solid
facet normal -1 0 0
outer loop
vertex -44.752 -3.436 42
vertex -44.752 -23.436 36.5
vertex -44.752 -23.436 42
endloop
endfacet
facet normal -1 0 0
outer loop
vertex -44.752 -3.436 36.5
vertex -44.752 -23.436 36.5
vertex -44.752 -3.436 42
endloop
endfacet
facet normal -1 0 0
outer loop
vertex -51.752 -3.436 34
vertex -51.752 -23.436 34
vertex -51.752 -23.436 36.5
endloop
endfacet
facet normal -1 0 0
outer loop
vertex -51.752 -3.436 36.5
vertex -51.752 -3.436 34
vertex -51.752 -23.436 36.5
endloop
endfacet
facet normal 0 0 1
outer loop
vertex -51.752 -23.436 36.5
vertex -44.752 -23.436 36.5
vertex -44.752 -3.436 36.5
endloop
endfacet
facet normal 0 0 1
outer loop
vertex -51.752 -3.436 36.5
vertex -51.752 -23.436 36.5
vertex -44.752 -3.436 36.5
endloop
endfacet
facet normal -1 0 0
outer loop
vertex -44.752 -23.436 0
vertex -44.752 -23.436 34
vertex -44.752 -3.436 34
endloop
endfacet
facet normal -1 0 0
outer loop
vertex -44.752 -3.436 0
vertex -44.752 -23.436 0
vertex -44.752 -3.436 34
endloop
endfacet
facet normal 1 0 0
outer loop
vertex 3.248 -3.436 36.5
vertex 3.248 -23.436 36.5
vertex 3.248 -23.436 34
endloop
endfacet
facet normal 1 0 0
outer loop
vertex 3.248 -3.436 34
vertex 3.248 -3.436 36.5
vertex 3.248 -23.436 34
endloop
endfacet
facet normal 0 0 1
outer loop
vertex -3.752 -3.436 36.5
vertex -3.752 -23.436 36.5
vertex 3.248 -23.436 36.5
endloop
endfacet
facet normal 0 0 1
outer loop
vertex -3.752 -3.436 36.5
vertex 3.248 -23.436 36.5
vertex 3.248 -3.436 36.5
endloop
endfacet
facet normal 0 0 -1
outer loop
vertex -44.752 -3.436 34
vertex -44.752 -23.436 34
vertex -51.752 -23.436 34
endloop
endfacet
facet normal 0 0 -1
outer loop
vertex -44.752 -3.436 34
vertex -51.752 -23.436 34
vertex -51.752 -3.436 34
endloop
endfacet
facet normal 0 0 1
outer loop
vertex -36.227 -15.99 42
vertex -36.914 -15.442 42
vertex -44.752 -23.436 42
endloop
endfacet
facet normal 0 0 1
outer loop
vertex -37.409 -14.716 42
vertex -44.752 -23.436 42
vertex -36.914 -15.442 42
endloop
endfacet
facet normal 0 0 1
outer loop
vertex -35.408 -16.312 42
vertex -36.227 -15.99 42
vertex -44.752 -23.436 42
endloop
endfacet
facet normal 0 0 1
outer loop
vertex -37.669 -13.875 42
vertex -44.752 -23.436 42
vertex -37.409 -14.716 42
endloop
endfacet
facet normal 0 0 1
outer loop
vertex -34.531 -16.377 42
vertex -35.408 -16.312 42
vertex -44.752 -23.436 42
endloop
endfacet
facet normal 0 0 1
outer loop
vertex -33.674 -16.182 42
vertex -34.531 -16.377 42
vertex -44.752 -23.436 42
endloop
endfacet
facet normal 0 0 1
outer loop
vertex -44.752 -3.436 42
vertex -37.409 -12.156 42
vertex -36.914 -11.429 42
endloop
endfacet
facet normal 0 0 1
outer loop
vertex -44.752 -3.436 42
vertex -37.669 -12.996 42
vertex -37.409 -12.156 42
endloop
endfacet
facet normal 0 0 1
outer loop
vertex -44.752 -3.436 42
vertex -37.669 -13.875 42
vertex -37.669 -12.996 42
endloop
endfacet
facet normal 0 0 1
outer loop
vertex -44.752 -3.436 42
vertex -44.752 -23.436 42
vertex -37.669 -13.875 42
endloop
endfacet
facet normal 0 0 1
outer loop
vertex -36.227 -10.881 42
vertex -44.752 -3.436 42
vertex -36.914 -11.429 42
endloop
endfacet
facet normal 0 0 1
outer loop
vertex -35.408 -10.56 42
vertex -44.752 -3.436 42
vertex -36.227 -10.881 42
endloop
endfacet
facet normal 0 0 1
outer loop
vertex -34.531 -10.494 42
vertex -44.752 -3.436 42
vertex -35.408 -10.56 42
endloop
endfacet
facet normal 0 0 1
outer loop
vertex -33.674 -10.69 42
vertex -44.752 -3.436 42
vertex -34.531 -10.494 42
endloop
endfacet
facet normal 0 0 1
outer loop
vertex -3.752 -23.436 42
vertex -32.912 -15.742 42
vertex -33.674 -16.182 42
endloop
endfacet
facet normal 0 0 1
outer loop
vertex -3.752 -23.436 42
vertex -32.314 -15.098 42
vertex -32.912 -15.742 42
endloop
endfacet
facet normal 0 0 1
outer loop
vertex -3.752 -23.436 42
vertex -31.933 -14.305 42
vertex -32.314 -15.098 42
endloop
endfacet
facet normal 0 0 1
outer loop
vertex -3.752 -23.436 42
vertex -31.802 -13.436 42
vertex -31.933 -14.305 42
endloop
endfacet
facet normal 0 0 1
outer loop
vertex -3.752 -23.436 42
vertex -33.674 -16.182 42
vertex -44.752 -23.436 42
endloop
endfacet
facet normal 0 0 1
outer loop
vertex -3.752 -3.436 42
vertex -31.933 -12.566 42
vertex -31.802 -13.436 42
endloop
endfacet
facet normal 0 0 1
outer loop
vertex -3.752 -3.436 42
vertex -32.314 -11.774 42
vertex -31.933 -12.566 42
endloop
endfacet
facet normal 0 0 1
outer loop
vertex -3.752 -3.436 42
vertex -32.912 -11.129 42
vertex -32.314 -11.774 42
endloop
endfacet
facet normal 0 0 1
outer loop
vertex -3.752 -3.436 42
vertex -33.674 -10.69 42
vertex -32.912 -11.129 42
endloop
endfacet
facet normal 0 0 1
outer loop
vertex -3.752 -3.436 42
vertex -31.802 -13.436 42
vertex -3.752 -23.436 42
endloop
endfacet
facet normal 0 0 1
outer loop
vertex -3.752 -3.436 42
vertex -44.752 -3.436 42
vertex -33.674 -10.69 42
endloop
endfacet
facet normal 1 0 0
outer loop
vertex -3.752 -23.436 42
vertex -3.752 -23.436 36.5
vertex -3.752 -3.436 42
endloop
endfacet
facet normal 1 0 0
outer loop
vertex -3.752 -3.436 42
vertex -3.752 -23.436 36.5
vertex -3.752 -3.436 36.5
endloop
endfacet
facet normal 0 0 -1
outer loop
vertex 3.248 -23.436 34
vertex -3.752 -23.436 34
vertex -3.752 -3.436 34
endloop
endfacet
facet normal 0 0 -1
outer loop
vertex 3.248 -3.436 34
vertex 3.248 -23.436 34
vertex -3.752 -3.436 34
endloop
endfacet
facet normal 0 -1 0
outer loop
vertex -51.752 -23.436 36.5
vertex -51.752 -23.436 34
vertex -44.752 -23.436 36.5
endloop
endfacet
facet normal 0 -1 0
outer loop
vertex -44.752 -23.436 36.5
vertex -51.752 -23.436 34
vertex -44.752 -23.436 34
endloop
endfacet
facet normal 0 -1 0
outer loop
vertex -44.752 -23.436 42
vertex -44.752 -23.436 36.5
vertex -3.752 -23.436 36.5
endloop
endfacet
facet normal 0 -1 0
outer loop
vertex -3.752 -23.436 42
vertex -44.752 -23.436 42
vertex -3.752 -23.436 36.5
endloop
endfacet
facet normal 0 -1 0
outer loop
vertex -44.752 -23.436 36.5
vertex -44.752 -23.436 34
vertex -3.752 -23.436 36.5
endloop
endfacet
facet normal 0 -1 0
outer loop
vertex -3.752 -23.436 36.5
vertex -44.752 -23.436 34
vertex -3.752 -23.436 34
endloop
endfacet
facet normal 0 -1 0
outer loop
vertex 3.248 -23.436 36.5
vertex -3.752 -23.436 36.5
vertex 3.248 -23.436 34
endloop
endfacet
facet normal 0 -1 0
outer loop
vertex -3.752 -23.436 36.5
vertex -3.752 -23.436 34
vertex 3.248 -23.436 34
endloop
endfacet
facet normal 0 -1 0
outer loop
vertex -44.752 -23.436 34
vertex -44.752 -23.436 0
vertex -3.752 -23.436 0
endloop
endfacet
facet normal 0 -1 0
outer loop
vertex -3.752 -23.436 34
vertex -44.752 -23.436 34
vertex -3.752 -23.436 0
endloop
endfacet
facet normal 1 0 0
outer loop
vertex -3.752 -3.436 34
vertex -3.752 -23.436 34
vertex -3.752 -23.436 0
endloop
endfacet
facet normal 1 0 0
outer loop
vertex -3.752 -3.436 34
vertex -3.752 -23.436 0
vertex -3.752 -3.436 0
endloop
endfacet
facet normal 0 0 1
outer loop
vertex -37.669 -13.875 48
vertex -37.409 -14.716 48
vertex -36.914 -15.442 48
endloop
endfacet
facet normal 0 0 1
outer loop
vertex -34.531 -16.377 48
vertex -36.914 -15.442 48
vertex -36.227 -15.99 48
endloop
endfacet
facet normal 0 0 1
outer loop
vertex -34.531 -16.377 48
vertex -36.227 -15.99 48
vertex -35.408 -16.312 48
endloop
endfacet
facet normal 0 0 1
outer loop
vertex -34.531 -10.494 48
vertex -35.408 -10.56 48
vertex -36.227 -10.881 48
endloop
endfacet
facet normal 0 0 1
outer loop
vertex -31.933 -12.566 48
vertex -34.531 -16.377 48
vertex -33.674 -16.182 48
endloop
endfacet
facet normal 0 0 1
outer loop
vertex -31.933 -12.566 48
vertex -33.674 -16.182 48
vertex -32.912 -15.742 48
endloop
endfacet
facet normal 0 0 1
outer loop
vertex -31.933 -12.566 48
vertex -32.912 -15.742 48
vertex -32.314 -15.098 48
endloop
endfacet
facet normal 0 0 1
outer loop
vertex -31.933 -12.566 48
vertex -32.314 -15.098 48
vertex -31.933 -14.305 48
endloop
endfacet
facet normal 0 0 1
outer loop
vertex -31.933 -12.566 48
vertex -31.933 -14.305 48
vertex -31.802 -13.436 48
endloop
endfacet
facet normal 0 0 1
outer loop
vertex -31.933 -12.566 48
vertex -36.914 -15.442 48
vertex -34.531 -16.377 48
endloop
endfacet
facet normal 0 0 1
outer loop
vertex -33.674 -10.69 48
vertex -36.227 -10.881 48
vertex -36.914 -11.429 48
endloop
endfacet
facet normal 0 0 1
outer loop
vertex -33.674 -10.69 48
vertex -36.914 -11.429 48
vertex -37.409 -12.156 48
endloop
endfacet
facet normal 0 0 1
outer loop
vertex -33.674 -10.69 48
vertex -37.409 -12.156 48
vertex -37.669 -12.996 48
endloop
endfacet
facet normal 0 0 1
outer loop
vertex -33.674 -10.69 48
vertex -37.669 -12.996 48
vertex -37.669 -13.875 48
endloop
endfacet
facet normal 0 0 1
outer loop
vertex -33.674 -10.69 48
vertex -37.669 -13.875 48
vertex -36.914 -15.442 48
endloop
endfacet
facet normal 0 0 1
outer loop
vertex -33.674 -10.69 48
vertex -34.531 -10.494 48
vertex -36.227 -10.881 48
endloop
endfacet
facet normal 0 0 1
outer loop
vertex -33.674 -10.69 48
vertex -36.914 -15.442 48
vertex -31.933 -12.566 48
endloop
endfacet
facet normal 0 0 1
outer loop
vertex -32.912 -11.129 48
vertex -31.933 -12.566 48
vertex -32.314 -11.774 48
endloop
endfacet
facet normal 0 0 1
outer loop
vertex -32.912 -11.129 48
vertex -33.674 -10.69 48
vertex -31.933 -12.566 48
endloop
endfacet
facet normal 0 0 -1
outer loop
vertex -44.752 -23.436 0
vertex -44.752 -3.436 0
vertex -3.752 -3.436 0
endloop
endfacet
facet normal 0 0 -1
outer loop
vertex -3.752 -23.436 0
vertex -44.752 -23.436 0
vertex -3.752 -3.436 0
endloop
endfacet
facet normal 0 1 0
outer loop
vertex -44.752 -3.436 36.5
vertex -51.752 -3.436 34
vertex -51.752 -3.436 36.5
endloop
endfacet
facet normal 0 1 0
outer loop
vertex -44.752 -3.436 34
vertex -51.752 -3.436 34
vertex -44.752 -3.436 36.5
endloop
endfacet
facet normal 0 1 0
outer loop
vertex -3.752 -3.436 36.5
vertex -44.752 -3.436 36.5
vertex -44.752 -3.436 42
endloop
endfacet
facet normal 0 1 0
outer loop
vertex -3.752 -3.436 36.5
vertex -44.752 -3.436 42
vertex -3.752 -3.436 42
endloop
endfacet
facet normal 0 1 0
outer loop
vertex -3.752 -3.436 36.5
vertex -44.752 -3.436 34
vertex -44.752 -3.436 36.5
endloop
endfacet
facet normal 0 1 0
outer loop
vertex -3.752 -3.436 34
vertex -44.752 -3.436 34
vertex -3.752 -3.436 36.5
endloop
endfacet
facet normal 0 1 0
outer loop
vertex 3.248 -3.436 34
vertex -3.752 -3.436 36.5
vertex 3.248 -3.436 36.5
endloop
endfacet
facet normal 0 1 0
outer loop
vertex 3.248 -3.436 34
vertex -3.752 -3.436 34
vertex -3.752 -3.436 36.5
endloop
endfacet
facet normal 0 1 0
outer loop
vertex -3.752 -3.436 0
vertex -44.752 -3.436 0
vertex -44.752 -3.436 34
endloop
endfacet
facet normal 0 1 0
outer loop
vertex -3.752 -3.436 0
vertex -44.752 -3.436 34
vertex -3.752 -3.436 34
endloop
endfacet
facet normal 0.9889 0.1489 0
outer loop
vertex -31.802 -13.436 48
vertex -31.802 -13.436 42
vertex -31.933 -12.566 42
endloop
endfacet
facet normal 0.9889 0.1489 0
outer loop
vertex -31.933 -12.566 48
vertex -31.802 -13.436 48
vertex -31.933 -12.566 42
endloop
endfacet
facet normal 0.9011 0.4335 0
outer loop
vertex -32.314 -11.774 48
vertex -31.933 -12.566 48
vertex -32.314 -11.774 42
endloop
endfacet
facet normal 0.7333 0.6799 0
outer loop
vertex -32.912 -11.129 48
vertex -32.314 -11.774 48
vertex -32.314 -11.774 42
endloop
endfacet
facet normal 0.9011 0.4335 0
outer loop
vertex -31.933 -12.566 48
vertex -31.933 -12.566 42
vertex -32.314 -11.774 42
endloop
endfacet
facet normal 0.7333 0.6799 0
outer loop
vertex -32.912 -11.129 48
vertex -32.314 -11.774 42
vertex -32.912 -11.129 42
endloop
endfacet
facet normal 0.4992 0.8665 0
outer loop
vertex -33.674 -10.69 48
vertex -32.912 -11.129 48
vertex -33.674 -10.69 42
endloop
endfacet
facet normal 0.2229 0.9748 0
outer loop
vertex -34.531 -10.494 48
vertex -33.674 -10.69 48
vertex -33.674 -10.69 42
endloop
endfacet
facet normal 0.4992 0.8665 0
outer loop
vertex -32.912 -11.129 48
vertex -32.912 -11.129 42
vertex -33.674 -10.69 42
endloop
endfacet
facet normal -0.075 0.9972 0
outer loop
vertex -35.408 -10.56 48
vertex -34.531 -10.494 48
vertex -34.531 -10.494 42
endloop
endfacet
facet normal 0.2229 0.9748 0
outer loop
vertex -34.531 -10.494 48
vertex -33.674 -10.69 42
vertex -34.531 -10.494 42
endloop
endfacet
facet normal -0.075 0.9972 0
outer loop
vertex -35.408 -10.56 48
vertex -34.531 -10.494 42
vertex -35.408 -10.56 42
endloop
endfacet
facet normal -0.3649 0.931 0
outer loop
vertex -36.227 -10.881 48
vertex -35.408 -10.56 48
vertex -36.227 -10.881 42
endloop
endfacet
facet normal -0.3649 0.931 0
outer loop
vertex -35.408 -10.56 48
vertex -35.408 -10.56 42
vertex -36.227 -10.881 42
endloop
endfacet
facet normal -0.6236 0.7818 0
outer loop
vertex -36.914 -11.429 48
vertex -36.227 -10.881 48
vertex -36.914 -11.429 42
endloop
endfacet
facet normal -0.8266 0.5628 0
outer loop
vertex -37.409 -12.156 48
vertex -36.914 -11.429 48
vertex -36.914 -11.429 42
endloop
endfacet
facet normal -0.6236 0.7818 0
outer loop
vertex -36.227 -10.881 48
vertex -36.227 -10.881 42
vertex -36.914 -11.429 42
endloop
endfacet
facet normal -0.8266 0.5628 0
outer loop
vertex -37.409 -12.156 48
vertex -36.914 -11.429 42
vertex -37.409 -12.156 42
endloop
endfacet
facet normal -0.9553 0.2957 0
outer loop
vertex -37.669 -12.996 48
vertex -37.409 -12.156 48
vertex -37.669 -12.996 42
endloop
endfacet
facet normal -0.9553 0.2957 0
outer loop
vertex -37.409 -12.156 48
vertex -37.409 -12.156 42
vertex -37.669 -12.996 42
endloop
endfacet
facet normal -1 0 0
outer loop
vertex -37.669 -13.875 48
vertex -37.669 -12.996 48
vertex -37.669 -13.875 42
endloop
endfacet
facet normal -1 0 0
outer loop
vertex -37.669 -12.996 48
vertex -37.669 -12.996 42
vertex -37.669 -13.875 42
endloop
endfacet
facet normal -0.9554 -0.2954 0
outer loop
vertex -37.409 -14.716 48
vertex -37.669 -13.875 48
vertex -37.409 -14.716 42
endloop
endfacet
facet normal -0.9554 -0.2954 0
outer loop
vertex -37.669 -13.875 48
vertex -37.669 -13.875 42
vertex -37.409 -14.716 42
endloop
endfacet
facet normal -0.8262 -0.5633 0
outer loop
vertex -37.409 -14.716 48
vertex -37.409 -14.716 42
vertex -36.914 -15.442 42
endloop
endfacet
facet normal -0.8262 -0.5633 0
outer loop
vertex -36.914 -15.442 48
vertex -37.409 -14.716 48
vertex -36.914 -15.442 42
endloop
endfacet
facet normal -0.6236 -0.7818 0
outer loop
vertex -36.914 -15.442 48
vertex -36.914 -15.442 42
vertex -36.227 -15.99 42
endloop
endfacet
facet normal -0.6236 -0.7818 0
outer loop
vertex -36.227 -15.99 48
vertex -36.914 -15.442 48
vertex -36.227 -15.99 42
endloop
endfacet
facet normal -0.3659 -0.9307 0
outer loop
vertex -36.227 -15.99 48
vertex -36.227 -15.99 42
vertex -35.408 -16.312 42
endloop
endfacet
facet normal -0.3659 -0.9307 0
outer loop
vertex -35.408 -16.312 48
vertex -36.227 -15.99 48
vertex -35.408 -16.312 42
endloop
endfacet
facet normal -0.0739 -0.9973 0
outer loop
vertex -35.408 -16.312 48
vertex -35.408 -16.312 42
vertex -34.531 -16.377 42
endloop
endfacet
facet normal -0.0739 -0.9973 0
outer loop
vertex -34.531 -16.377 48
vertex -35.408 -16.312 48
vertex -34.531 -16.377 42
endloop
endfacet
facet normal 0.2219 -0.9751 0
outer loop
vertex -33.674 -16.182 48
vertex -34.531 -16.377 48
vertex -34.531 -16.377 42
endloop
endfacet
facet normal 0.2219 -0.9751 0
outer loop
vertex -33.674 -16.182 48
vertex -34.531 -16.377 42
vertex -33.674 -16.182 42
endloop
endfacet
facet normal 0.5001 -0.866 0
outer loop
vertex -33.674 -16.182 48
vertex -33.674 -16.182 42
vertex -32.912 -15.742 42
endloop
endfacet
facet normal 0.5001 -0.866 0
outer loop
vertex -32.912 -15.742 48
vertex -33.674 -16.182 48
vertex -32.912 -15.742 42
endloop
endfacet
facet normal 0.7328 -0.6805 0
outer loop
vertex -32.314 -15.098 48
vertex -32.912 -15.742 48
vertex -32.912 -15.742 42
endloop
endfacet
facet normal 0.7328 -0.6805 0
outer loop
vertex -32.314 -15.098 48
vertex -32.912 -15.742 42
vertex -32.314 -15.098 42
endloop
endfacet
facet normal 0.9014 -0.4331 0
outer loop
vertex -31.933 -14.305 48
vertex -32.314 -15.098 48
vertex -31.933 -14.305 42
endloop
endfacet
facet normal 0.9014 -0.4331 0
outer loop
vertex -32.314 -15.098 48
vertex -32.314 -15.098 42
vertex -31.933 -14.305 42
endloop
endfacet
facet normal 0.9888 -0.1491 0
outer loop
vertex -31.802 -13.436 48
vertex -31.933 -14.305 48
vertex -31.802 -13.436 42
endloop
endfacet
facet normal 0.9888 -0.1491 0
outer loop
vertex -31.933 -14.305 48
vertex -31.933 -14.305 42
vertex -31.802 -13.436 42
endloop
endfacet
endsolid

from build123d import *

# Parameters (mm, degrees)
SKETCH_1_W      = 41
SKETCH_1_H      = 20
EXTRUDE_1_DEPTH = 42
SKETCH_3_W      = 2.5
SKETCH_3_H      = 20
EXTRUDE_2_DEPTH = 7
SKETCH_4_W      = 2.5
SKETCH_4_H      = 20
EXTRUDE_3_DEPTH = 7
SKETCH_5_R      = 2.95
EXTRUDE_4_DEPTH = 6


with BuildPart() as part:
    # ｽｹｯﾁ1 → ﾎﾞｽ - 押し出し1 (new body)
    with BuildSketch(Plane.XY):
        with Locations((-24.251560295, -13.435714286)):
            Rectangle(SKETCH_1_W, SKETCH_1_H)
    extrude(amount=EXTRUDE_1_DEPTH)

    # ｽｹｯﾁ3 → ﾎﾞｽ - 押し出し2 (add)
    with BuildSketch(Plane(origin=(-3.751560295, 0, 0), x_dir=(0, 0, -1), z_dir=(1, 0, 0))):
        with Locations((-35.25, -13.435714286)):
            Rectangle(SKETCH_3_W, SKETCH_3_H)
    extrude(amount=EXTRUDE_2_DEPTH)

    # ｽｹｯﾁ4 → ﾎﾞｽ - 押し出し3 (add)
    with BuildSketch(Plane.ZY.offset(44.751560295)):
        with Locations((35.25, -13.435714286)):
            Rectangle(SKETCH_4_W, SKETCH_4_H)
    extrude(amount=EXTRUDE_3_DEPTH)

    # ｽｹｯﾁ5 → ﾎﾞｽ - 押し出し4 (add)
    with BuildSketch(Plane.XY.offset(42)):
        with Locations((-34.751560295, -13.435714286)):
            Circle(SKETCH_5_R)
    extrude(amount=EXTRUDE_4_DEPTH)


solid = part.part
